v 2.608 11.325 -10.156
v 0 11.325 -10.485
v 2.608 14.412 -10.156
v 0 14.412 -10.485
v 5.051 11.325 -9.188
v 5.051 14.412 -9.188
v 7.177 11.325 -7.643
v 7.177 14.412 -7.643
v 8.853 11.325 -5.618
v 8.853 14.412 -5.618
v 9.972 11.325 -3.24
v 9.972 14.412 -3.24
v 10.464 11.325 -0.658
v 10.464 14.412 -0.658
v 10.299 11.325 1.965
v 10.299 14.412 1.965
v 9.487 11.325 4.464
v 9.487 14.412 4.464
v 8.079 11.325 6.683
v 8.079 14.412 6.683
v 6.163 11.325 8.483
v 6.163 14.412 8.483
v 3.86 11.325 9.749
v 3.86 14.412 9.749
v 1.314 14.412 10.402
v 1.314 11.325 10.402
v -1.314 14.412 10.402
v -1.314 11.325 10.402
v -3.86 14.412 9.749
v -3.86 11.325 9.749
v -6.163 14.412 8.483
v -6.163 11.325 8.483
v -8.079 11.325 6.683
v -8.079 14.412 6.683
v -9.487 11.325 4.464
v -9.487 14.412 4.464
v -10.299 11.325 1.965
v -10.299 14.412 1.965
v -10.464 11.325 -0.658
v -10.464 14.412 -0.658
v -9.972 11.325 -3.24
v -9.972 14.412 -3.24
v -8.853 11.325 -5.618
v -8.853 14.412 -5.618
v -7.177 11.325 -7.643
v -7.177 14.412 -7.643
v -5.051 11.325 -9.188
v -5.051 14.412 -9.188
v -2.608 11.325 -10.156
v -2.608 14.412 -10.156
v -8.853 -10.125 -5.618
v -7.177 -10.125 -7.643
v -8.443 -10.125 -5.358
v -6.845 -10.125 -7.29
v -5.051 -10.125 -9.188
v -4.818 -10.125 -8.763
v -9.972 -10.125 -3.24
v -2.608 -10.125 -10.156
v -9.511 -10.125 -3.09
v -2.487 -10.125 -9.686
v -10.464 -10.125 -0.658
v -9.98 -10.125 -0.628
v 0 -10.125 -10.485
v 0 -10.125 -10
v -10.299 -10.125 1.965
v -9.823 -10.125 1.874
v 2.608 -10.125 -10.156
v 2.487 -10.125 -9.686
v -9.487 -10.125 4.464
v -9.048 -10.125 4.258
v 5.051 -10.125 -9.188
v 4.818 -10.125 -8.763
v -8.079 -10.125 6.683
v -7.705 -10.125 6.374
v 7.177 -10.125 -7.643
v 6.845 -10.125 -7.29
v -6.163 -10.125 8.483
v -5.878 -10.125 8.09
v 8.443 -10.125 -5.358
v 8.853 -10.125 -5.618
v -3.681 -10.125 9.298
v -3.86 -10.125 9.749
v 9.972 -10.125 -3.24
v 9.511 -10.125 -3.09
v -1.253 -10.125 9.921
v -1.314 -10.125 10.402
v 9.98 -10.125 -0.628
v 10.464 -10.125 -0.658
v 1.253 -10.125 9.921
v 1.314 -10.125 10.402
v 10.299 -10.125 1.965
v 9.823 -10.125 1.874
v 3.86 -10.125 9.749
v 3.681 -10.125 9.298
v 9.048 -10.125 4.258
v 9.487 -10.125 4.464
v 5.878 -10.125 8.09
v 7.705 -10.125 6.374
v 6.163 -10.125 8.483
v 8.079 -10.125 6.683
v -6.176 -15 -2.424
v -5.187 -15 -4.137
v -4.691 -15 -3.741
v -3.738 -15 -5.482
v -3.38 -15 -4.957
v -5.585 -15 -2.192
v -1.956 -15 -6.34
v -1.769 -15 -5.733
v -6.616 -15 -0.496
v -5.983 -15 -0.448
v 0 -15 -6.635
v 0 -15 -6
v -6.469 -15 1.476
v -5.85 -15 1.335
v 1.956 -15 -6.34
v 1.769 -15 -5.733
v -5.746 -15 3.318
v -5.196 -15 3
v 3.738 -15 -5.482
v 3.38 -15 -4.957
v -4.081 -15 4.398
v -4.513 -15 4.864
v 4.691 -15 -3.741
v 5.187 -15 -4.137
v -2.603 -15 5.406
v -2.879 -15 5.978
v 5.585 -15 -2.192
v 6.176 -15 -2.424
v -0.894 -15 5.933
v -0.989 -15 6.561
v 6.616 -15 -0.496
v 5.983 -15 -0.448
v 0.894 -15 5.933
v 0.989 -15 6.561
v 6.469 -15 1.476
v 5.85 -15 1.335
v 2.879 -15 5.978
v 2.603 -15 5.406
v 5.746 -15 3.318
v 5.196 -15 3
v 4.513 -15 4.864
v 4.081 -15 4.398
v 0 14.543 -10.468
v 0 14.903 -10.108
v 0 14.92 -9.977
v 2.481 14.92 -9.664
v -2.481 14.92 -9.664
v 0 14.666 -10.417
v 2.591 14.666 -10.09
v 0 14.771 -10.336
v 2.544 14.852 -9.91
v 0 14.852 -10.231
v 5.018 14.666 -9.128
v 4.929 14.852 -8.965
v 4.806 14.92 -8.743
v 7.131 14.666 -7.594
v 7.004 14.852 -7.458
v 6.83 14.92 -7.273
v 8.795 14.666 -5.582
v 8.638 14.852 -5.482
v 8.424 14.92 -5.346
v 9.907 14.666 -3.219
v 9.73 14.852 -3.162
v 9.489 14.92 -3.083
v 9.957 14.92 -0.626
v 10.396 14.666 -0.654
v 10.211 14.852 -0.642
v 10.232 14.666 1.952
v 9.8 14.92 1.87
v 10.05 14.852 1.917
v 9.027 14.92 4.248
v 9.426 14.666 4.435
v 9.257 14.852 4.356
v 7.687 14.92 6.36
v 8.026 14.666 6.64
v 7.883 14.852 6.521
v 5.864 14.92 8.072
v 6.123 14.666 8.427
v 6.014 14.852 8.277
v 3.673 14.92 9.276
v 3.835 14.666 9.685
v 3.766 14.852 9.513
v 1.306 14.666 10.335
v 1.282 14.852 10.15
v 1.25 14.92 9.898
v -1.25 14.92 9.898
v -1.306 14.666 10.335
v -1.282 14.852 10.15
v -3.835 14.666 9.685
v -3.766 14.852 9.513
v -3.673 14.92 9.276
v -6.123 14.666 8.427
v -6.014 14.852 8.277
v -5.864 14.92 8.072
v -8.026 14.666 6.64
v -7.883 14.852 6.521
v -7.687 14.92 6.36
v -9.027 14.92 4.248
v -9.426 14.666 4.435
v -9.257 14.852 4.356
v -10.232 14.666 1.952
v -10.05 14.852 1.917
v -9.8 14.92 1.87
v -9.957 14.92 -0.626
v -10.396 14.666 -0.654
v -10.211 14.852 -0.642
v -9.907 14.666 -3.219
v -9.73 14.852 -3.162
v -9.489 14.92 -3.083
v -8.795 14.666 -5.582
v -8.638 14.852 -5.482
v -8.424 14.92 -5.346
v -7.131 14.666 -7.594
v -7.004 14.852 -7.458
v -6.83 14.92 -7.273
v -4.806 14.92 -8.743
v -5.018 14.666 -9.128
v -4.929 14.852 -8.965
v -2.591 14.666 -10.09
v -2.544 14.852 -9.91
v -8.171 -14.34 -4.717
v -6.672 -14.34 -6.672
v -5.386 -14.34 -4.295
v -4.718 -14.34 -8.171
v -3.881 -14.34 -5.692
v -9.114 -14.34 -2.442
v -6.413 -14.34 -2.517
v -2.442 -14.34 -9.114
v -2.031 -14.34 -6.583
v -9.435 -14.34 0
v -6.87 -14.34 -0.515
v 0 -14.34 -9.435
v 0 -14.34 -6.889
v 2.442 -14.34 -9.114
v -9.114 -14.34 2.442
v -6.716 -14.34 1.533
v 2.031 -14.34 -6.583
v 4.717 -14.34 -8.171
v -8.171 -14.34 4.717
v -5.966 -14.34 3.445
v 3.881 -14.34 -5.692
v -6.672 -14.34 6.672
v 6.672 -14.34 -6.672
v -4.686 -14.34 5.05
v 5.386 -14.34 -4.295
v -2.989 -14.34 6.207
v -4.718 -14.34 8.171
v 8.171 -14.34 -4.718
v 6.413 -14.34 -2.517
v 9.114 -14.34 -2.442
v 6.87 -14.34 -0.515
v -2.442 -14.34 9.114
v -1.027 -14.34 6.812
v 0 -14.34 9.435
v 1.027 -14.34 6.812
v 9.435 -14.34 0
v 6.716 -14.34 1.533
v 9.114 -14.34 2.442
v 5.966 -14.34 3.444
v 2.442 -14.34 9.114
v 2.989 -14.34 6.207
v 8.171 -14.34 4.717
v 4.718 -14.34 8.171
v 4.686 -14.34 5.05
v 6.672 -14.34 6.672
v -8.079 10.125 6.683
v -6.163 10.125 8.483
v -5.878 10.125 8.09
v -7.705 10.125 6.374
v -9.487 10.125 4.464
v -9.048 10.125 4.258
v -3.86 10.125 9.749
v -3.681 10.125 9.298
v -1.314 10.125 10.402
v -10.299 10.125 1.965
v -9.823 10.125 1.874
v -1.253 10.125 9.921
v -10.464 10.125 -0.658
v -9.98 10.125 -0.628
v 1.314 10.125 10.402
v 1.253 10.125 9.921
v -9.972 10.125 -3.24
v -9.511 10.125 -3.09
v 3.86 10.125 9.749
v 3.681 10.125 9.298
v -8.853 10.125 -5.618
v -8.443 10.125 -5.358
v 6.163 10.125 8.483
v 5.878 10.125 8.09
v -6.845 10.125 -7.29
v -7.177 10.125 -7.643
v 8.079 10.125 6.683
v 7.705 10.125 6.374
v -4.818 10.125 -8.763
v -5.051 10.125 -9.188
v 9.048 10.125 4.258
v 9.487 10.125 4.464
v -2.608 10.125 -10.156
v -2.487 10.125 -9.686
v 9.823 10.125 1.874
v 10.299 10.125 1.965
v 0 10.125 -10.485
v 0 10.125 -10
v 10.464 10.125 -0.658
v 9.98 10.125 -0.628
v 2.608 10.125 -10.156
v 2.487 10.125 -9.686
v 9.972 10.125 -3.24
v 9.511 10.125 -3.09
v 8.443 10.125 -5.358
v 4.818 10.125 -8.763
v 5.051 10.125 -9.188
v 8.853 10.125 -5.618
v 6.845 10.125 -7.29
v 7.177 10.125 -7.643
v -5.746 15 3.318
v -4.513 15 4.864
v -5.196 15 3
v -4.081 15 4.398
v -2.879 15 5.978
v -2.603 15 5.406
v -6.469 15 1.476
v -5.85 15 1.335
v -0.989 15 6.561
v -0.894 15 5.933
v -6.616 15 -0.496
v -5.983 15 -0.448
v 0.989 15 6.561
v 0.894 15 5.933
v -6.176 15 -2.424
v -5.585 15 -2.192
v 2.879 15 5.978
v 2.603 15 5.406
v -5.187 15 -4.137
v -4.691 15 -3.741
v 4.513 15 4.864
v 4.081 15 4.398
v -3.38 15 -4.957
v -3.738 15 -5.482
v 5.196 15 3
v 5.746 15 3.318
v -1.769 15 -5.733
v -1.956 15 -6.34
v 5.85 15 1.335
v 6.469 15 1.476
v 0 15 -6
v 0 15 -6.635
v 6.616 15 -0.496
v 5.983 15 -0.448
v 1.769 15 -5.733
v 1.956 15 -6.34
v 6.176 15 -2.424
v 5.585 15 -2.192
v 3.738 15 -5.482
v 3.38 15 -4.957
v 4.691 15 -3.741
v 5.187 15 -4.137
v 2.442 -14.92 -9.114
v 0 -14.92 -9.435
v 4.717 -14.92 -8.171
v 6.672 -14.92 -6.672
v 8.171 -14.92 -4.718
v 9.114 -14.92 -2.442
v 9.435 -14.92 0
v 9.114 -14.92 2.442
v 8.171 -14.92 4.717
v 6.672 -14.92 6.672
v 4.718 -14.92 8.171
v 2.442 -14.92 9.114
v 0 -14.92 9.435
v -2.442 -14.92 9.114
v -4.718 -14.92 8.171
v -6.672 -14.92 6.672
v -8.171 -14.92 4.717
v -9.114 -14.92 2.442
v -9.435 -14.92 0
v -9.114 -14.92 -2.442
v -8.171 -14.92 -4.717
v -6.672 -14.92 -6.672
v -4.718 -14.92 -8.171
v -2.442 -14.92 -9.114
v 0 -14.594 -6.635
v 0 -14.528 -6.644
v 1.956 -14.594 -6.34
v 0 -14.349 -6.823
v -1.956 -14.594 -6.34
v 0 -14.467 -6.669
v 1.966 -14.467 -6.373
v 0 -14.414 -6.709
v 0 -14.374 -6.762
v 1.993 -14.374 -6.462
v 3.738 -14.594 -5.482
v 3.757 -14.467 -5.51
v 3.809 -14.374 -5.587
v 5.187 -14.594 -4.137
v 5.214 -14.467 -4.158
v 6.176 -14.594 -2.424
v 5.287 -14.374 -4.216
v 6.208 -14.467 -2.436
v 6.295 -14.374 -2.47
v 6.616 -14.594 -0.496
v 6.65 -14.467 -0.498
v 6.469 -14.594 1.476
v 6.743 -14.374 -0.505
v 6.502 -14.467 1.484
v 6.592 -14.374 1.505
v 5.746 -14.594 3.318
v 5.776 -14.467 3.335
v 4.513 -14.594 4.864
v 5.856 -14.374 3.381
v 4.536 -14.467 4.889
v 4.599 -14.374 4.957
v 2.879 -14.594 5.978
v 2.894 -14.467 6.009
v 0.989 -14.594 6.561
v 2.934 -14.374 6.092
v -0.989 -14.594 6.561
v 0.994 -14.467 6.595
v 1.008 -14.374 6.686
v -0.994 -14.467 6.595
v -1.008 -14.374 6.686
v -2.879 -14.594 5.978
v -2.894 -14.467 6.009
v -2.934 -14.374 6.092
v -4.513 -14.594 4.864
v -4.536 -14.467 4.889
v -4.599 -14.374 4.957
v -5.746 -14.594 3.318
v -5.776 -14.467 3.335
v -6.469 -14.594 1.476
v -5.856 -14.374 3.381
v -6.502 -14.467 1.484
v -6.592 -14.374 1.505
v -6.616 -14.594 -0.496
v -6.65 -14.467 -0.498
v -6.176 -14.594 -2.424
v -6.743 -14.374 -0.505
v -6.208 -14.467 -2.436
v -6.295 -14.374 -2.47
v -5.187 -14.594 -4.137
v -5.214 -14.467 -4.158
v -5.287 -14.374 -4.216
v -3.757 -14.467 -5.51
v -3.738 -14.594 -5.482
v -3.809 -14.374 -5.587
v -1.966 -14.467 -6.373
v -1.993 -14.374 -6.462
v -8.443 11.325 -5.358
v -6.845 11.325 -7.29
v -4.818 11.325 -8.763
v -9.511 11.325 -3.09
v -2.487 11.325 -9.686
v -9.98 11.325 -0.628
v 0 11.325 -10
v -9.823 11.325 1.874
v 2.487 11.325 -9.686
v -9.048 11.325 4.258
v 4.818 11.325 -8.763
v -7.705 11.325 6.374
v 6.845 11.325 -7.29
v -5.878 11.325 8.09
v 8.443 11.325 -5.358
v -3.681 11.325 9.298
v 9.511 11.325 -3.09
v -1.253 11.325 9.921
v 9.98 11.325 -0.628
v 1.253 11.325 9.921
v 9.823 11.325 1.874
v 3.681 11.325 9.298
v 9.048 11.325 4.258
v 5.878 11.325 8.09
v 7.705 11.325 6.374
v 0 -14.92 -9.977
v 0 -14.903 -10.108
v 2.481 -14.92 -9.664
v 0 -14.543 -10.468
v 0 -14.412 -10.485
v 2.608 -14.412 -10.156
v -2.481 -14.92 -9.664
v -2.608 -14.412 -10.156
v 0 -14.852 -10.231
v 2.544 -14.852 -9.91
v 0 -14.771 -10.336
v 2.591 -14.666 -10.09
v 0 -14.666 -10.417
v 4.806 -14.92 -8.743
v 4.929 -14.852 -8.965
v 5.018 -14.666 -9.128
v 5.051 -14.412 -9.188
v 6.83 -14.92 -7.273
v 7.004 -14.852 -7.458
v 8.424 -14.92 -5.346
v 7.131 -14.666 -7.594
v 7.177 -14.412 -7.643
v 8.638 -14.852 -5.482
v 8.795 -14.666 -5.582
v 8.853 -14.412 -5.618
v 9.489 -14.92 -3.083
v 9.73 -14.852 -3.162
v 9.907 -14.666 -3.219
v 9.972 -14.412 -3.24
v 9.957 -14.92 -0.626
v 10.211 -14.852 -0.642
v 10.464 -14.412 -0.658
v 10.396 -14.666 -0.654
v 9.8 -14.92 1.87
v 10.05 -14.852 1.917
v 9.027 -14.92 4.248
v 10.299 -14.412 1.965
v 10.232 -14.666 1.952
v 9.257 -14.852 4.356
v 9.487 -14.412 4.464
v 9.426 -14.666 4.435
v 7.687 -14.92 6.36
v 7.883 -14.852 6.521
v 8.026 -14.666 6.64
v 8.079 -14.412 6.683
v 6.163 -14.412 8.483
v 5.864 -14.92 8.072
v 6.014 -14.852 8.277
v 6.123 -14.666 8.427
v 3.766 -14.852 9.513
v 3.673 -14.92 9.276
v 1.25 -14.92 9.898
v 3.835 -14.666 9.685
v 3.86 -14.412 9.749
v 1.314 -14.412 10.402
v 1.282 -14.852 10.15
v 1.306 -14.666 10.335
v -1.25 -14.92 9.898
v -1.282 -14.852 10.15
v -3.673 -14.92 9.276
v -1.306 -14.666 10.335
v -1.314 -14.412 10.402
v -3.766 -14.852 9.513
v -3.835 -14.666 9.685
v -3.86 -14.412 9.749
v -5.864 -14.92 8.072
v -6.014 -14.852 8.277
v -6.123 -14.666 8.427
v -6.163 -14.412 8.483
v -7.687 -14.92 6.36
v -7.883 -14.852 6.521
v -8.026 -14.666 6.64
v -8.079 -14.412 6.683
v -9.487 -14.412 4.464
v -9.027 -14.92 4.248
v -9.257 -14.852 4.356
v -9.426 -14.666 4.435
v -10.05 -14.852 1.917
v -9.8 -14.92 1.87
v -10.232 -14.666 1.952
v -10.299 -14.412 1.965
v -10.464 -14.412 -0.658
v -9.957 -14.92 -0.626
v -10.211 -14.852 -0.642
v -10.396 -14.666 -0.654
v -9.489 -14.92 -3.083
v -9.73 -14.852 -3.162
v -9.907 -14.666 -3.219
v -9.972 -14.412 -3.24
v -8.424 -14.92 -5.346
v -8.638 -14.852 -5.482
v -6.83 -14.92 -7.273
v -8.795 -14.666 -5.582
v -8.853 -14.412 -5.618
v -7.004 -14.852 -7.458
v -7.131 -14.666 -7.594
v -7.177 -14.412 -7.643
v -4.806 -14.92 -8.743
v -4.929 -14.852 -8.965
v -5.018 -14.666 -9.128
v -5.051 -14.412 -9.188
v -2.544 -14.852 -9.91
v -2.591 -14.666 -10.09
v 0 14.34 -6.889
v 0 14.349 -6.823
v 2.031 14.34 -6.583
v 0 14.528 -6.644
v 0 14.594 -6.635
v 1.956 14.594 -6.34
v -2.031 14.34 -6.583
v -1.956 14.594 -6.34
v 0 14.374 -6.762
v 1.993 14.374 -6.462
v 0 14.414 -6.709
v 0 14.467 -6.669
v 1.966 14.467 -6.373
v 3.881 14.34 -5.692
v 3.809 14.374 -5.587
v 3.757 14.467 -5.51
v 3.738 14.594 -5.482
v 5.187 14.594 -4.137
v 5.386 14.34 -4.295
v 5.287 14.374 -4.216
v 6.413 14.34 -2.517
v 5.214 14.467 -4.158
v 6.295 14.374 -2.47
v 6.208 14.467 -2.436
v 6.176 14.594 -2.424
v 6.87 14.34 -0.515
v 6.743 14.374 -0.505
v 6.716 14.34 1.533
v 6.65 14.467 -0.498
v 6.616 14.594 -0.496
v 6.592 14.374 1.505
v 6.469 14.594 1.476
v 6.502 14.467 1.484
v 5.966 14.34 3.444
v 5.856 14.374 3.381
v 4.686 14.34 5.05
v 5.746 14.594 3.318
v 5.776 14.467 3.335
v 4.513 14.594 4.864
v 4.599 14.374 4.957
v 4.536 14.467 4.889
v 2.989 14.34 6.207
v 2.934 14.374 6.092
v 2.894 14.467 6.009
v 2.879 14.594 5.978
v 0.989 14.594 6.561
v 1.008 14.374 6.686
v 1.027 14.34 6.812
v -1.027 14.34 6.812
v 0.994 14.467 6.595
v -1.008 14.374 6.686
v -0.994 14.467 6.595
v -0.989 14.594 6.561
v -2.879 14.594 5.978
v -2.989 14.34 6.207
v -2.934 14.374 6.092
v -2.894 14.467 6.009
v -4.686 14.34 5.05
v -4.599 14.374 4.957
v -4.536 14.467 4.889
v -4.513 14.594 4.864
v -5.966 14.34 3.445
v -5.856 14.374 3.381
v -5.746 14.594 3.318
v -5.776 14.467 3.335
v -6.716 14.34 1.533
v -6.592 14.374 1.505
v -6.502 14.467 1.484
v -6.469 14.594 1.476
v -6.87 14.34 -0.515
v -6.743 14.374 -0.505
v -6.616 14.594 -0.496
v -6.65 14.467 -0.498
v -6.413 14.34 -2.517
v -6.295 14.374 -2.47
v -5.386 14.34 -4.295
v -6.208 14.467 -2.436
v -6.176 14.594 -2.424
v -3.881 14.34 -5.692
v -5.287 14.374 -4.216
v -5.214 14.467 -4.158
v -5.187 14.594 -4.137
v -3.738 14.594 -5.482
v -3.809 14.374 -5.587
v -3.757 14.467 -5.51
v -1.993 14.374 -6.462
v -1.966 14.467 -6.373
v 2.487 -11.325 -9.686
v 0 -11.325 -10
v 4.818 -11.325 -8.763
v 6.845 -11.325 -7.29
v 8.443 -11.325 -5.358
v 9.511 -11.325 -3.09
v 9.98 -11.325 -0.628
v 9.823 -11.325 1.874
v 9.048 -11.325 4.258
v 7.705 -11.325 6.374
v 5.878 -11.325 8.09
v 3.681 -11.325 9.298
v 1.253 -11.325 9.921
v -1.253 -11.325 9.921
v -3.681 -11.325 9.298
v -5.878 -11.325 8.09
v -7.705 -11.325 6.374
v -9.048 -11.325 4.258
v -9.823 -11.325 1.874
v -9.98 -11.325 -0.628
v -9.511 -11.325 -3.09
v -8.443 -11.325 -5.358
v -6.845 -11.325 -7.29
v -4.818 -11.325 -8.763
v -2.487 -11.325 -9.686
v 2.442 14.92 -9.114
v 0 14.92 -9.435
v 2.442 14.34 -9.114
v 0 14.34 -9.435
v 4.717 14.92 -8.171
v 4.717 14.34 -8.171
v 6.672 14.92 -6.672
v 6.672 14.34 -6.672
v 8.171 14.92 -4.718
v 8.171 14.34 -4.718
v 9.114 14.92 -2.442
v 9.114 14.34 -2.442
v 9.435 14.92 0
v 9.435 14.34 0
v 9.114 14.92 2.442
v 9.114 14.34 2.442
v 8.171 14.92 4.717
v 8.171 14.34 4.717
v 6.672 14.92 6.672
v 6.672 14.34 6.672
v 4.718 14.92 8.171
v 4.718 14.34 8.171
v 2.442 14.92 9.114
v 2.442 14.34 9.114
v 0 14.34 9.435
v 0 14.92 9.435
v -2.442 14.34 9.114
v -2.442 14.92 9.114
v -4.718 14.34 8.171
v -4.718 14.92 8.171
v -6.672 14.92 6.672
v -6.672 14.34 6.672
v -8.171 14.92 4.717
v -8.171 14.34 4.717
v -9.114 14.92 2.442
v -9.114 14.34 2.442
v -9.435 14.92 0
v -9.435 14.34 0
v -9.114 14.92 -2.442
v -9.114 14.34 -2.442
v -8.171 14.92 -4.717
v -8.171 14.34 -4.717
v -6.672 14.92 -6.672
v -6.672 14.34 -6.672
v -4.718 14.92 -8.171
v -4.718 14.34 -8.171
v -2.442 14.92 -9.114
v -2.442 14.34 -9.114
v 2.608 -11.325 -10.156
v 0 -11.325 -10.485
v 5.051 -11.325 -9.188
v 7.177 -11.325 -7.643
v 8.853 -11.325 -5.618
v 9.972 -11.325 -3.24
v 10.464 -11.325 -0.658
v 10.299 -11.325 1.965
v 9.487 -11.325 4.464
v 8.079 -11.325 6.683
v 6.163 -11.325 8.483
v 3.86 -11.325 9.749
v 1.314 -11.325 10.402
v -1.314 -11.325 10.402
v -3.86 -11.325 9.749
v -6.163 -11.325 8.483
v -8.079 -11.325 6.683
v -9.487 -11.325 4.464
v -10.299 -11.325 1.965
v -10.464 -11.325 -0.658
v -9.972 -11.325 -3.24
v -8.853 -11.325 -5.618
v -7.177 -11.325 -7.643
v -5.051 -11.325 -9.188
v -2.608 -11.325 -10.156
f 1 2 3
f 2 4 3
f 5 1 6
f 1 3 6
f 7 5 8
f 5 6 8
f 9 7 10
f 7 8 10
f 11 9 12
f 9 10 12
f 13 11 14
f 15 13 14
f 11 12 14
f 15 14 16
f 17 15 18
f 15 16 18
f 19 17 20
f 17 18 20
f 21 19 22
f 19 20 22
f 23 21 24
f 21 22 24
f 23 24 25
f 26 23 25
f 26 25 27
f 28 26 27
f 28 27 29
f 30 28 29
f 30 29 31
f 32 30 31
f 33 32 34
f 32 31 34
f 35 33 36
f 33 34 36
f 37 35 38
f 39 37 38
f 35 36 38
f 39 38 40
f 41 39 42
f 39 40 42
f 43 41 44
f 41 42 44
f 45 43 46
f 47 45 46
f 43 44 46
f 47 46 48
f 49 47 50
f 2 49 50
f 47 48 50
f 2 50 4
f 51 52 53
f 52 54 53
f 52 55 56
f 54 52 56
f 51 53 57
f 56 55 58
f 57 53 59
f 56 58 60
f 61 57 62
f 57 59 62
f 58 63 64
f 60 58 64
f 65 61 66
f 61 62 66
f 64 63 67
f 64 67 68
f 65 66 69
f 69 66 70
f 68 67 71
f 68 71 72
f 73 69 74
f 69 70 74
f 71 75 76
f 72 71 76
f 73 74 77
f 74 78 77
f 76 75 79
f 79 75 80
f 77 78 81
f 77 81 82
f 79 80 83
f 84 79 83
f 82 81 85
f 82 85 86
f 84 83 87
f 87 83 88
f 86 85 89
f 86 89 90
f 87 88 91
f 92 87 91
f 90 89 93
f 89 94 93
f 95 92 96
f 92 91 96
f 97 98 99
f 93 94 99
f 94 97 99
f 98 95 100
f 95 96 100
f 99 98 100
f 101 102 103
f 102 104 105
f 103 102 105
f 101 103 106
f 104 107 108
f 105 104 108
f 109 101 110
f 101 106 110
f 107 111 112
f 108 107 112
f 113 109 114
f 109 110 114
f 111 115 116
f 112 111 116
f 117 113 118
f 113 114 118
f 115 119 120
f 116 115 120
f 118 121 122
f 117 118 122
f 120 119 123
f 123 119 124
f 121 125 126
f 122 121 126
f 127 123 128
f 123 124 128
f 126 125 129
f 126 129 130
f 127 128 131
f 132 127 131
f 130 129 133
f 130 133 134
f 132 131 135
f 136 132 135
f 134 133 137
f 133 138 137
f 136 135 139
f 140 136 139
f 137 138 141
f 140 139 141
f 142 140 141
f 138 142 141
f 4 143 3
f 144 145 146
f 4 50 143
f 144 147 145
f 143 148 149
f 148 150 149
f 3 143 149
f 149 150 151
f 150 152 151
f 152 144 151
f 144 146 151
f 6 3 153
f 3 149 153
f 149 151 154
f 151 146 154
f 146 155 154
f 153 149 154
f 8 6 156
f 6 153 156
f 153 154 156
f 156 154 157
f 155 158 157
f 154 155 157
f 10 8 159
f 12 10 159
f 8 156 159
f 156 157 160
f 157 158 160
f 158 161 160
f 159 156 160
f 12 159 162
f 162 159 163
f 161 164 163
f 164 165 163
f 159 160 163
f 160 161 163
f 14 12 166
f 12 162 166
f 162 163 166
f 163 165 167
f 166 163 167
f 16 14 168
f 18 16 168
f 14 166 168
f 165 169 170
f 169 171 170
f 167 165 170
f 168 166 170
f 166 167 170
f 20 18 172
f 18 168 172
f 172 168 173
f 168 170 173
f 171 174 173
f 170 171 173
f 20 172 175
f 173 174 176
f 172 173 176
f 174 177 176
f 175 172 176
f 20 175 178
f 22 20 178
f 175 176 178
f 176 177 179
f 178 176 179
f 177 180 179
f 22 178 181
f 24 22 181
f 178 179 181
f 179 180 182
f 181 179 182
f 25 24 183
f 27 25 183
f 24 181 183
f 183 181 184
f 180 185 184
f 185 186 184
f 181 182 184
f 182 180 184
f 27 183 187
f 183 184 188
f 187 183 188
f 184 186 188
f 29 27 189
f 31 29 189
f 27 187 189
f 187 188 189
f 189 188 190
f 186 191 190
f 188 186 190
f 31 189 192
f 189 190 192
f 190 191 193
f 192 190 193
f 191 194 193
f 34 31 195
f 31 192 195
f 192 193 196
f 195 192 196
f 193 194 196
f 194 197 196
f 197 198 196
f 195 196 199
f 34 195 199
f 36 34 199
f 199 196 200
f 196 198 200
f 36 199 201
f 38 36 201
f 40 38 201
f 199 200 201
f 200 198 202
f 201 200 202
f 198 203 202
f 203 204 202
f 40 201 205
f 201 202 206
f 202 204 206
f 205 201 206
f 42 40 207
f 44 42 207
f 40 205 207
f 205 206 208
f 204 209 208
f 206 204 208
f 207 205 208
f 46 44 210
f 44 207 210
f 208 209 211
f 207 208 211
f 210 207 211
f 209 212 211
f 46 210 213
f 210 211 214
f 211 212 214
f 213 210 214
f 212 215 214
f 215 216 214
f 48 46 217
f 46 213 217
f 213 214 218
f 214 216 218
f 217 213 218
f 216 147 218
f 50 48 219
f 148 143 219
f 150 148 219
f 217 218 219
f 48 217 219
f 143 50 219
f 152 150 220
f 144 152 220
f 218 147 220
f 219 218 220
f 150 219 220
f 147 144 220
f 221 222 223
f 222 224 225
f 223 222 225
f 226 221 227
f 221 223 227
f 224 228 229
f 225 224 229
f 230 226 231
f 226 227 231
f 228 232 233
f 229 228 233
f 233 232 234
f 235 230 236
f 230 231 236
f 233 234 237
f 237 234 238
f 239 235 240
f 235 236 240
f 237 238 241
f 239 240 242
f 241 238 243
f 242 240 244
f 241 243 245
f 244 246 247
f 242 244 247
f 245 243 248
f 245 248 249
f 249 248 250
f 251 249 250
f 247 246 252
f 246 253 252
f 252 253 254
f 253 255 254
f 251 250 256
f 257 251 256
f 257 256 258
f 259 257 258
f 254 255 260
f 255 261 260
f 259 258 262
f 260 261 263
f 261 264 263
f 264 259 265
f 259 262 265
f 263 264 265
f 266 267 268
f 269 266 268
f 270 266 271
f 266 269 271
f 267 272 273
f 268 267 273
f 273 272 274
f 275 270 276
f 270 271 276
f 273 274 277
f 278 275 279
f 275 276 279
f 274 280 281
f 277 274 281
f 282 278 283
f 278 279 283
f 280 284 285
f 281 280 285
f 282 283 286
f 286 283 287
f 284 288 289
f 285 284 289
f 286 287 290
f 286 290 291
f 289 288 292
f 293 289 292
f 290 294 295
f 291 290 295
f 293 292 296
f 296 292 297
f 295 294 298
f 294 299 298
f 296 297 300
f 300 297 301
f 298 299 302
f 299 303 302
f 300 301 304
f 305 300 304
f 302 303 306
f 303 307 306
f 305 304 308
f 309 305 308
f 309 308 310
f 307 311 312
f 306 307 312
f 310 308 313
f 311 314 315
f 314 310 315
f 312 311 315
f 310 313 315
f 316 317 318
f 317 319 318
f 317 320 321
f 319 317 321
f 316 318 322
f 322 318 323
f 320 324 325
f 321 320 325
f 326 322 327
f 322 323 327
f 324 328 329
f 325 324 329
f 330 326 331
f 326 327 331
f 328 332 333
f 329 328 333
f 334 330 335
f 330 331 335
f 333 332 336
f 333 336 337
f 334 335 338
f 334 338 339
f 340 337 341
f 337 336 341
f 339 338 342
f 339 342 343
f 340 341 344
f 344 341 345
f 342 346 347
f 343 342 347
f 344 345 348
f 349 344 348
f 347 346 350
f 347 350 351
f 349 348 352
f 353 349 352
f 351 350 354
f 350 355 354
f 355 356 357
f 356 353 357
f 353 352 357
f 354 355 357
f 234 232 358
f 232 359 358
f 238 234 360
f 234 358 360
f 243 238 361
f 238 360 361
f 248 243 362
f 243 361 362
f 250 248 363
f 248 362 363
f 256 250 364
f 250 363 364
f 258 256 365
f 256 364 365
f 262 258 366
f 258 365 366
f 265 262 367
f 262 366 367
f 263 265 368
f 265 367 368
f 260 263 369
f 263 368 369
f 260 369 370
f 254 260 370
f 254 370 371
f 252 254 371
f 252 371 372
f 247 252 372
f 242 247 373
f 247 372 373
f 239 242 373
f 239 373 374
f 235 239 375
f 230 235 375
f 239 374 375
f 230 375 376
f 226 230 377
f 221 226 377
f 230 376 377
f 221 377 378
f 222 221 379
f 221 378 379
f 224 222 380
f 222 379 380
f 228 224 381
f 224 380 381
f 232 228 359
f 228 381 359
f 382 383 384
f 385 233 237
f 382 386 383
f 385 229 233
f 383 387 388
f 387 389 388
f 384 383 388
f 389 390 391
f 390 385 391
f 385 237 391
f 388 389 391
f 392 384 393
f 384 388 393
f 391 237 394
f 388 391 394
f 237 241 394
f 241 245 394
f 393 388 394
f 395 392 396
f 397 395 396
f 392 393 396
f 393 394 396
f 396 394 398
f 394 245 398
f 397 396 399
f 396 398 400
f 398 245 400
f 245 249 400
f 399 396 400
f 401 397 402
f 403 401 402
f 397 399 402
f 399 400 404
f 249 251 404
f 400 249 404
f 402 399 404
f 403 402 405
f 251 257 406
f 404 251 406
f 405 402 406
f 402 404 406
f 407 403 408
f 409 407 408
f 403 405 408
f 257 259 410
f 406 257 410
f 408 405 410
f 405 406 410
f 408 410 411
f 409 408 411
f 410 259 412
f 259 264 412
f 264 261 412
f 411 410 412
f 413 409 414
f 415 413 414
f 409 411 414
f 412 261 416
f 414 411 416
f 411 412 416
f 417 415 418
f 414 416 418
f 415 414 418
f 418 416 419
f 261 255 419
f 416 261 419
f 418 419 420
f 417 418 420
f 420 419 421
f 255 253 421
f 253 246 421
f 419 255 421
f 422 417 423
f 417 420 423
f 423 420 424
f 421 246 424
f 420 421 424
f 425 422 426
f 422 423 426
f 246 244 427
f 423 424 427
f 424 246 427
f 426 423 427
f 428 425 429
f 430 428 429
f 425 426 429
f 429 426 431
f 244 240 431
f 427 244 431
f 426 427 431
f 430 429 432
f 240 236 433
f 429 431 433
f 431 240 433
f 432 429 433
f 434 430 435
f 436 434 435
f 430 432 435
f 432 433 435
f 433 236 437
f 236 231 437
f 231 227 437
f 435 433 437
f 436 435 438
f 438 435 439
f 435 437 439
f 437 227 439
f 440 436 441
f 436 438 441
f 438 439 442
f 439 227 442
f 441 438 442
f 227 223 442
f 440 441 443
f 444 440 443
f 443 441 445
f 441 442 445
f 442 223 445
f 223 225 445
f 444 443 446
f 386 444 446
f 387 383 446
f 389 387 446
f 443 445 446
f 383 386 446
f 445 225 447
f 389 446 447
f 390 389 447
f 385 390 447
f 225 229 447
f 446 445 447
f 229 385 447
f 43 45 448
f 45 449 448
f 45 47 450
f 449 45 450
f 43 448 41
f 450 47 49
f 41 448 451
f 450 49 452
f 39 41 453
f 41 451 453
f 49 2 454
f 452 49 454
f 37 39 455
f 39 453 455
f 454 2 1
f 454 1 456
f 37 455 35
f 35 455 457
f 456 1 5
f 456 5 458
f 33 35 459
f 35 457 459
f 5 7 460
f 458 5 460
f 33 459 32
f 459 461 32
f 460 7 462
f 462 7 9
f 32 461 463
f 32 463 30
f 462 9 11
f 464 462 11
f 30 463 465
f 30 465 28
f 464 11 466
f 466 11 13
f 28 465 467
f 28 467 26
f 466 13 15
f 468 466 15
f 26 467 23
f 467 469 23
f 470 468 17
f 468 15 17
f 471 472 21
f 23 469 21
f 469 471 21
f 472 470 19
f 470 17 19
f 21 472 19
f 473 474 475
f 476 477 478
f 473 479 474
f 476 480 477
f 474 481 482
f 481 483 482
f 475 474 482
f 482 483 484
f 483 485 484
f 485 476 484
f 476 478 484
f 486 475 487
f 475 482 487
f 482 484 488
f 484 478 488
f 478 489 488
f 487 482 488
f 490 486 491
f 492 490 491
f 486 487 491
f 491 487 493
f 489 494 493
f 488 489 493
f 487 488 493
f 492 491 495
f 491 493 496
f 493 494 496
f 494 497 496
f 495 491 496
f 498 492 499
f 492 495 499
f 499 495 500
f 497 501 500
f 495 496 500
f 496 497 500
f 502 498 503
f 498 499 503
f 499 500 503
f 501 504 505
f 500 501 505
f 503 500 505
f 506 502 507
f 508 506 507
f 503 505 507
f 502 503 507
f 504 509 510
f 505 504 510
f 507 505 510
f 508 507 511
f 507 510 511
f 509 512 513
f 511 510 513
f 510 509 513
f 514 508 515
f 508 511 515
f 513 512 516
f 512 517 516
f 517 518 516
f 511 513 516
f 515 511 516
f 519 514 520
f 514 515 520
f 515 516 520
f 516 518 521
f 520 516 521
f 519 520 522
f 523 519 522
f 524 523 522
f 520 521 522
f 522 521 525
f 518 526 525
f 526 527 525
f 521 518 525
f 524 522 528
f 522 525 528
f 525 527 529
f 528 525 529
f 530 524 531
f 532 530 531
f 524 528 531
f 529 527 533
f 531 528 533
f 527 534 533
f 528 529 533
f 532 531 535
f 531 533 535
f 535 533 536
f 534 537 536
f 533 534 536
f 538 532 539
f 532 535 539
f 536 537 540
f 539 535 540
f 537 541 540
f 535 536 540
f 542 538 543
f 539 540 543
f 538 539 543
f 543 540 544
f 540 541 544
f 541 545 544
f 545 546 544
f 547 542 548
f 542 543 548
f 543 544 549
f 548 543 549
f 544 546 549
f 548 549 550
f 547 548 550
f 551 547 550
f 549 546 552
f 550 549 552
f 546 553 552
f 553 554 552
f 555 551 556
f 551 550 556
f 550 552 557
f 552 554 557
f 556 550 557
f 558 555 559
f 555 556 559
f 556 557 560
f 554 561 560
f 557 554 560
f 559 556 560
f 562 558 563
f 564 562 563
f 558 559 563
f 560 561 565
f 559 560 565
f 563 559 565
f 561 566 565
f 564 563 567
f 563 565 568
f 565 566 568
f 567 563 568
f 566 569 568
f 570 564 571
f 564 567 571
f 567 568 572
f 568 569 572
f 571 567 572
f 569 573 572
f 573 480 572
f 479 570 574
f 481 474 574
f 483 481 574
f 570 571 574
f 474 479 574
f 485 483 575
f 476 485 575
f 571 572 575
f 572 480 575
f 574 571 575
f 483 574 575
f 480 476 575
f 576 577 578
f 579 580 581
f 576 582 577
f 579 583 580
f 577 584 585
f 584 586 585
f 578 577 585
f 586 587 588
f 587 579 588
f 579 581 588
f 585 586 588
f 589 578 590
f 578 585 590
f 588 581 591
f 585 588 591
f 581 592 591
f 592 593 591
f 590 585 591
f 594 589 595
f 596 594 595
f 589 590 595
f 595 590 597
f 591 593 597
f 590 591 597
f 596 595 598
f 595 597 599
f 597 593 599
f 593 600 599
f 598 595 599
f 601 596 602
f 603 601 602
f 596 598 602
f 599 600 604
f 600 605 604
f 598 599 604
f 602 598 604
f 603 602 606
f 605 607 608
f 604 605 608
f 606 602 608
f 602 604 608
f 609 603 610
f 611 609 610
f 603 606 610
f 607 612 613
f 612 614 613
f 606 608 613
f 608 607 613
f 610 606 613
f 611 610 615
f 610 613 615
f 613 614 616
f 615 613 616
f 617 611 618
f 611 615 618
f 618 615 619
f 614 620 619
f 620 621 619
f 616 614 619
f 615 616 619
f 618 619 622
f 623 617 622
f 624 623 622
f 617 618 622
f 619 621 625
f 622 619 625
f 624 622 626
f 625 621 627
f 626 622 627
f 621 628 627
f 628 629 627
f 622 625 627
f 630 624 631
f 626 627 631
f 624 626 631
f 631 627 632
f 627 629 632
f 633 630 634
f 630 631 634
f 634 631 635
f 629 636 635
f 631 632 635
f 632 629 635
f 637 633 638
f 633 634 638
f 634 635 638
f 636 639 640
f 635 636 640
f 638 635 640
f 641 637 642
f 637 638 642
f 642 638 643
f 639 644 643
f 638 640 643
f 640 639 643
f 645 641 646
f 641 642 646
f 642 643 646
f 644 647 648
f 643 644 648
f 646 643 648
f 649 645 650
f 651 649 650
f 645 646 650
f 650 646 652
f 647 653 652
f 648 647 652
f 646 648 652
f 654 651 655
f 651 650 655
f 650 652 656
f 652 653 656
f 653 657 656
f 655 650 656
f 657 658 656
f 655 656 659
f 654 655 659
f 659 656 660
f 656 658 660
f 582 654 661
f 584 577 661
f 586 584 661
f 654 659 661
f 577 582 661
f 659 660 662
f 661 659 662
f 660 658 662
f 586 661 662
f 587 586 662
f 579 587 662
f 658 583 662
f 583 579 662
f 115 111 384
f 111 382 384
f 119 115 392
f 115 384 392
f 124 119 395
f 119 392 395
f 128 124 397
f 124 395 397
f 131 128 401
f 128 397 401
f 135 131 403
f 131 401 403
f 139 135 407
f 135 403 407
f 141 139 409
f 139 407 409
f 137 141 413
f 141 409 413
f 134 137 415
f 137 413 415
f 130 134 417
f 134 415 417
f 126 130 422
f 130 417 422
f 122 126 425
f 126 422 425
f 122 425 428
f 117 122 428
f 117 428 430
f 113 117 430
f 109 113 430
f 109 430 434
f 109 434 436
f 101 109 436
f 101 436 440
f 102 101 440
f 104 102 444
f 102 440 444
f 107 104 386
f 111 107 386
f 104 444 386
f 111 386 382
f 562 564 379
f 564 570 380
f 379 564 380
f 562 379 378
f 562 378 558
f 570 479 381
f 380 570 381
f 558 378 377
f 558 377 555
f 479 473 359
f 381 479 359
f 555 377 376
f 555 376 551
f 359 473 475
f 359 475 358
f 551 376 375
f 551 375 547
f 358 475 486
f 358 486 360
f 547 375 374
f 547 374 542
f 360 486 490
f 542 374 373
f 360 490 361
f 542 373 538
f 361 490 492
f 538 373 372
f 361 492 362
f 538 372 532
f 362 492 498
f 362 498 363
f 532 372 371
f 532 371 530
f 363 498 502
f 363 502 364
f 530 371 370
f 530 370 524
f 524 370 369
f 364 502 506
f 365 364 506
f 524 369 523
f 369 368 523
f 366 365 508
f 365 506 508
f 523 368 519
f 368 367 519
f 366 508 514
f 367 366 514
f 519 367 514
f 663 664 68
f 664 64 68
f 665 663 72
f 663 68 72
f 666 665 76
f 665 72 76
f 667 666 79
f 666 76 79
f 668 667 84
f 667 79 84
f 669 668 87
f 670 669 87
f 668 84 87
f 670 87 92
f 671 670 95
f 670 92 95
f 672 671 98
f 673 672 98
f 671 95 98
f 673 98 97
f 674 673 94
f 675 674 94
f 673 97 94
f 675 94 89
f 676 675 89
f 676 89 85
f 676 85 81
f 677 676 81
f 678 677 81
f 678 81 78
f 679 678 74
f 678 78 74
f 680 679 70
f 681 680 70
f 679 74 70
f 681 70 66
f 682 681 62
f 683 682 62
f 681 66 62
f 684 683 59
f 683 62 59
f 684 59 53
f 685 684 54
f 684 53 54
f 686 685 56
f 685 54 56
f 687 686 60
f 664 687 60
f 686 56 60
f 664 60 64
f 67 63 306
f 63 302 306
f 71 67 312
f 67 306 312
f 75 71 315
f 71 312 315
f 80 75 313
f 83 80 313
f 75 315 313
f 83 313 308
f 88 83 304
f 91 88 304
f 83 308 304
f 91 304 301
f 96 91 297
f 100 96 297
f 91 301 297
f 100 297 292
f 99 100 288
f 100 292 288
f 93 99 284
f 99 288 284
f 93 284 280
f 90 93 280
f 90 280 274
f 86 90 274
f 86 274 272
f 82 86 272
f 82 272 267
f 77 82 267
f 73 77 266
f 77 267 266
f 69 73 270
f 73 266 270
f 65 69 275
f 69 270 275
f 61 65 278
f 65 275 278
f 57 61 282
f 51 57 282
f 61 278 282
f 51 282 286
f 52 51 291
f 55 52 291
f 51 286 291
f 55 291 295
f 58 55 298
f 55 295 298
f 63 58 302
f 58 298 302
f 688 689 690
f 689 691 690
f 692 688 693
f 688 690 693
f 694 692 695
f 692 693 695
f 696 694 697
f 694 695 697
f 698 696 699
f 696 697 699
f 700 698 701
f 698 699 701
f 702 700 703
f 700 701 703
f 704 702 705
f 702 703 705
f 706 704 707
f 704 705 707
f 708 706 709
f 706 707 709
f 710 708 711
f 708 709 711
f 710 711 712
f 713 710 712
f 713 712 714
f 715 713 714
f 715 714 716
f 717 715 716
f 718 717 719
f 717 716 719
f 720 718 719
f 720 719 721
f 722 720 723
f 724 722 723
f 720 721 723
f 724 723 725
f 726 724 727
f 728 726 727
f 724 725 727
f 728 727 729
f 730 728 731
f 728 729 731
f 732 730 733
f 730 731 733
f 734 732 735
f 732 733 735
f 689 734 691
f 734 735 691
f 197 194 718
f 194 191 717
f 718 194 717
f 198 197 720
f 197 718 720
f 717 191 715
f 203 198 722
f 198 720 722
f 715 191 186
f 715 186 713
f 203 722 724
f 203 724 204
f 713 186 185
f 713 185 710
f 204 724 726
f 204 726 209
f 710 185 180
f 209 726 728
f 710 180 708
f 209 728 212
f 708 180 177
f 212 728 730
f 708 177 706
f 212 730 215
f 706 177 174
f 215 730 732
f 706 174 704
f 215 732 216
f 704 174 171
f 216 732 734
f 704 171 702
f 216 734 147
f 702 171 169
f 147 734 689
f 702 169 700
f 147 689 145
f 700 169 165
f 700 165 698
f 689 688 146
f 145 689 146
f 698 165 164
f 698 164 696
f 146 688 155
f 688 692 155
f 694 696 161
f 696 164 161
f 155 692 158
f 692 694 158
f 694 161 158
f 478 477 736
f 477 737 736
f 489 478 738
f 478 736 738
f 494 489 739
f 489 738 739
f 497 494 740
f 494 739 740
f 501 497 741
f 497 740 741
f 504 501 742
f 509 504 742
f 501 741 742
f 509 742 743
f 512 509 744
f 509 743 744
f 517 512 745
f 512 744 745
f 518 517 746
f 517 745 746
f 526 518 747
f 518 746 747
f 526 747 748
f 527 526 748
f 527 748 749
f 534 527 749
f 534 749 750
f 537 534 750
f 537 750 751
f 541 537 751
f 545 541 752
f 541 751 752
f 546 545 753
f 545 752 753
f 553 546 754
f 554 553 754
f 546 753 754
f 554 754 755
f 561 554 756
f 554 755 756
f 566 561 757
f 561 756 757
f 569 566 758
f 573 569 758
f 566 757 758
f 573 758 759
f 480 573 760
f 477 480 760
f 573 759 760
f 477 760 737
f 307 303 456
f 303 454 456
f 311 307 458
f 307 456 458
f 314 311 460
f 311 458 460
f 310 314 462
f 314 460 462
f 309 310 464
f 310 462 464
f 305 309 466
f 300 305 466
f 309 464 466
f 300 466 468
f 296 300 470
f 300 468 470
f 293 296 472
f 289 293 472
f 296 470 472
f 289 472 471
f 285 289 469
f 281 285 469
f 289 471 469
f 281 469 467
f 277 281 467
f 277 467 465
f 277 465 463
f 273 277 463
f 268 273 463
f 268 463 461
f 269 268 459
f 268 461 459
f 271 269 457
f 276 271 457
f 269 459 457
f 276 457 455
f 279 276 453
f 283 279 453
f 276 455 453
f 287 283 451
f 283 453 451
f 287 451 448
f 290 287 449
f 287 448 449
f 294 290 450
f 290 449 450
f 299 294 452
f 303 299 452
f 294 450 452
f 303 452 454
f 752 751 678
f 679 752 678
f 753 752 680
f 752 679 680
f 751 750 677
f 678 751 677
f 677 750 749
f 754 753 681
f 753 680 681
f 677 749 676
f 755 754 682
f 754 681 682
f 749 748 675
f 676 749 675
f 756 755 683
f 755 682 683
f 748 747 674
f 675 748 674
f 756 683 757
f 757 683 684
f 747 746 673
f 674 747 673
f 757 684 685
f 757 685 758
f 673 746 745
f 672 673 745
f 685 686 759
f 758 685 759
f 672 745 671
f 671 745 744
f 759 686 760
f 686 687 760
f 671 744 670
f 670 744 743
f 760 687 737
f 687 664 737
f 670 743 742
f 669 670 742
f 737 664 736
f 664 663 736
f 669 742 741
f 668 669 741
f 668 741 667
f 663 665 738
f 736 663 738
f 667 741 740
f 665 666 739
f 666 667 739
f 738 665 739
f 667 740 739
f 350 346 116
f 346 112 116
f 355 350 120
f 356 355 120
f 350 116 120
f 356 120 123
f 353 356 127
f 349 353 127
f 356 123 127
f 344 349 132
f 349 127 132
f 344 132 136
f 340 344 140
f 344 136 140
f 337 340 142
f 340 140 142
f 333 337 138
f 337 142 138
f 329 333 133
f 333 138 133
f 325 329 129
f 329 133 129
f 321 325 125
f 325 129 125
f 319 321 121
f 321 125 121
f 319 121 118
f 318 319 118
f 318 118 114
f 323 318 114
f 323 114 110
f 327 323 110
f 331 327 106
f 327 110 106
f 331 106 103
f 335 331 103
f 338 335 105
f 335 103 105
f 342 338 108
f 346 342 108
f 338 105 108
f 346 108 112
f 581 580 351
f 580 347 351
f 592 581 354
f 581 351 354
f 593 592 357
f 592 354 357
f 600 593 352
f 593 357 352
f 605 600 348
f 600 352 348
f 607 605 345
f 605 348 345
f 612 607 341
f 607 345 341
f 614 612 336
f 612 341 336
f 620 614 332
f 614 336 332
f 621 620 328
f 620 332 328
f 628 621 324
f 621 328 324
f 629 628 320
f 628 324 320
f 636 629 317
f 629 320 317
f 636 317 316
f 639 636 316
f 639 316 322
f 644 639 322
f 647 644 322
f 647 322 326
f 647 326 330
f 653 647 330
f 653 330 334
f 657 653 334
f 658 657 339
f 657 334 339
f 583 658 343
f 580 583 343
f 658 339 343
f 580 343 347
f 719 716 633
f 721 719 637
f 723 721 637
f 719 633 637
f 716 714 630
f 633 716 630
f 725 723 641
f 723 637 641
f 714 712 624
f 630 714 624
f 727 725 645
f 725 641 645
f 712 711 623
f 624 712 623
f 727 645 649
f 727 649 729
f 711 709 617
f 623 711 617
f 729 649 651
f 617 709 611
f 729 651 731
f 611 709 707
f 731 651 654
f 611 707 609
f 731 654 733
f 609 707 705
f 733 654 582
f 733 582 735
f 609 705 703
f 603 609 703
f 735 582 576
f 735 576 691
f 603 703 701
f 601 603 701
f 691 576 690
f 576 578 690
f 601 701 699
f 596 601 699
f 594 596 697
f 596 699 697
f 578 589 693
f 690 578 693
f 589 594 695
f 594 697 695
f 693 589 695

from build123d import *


with BuildPart() as part:
    # Sketch1 → Revolve1 (revolve)
    with BuildSketch(Plane.XY, mode=Mode.PRIVATE) as revolve1_sk:
        with BuildLine():
            Line((6.635, 15.0004), (6, 15.0004))
            Line((6, 15.0004), (6, -15.0004))
            Line((6, -15.0004), (6.635, -15.0004))
            Line((6.635, -15.0004), (6.635, -14.594))
            ThreePointArc((6.635, -14.594), (6.709394878, -14.414394878), (6.889, -14.34))
            Line((6.889, -14.34), (9.435, -14.34))
            Line((9.435, -14.34), (9.435, -14.92))
            Line((9.435, -14.92), (9.977, -14.92))
            ThreePointArc((9.977, -14.92), (10.336210245, -14.771210245), (10.485, -14.412))
            Line((10.485, -14.412), (10.485, -11.325))
            Line((10.485, -11.325), (10, -11.325))
            Line((10, -11.325), (10, -10.125))
            Line((10, -10.125), (10.485, -10.125))
            Line((10.485, -10.125), (10.485, 10.125))
            Line((10.485, 10.125), (10, 10.125))
            Line((10, 10.125), (10, 11.325))
            Line((10, 11.325), (10.485, 11.325))
            Line((10.485, 11.325), (10.485, 14.412))
            ThreePointArc((10.485, 14.412), (10.336210245, 14.771210245), (9.977, 14.92))
            Line((9.977, 14.92), (9.435, 14.92))
            Line((9.435, 14.92), (9.435, 14.34))
            Line((9.435, 14.34), (6.889, 14.34))
            ThreePointArc((6.889, 14.34), (6.709394878, 14.414394878), (6.635, 14.594))
            Line((6.635, 14.594), (6.635, 15.0004))
        make_face()
    revolve(revolve1_sk.sketch.rotate(Axis((0, 15.0004, 0), (0, -1, 0)), 270), axis=Axis((0, 15.0004, 0), (0, -1, 0)))


solid = part.part
